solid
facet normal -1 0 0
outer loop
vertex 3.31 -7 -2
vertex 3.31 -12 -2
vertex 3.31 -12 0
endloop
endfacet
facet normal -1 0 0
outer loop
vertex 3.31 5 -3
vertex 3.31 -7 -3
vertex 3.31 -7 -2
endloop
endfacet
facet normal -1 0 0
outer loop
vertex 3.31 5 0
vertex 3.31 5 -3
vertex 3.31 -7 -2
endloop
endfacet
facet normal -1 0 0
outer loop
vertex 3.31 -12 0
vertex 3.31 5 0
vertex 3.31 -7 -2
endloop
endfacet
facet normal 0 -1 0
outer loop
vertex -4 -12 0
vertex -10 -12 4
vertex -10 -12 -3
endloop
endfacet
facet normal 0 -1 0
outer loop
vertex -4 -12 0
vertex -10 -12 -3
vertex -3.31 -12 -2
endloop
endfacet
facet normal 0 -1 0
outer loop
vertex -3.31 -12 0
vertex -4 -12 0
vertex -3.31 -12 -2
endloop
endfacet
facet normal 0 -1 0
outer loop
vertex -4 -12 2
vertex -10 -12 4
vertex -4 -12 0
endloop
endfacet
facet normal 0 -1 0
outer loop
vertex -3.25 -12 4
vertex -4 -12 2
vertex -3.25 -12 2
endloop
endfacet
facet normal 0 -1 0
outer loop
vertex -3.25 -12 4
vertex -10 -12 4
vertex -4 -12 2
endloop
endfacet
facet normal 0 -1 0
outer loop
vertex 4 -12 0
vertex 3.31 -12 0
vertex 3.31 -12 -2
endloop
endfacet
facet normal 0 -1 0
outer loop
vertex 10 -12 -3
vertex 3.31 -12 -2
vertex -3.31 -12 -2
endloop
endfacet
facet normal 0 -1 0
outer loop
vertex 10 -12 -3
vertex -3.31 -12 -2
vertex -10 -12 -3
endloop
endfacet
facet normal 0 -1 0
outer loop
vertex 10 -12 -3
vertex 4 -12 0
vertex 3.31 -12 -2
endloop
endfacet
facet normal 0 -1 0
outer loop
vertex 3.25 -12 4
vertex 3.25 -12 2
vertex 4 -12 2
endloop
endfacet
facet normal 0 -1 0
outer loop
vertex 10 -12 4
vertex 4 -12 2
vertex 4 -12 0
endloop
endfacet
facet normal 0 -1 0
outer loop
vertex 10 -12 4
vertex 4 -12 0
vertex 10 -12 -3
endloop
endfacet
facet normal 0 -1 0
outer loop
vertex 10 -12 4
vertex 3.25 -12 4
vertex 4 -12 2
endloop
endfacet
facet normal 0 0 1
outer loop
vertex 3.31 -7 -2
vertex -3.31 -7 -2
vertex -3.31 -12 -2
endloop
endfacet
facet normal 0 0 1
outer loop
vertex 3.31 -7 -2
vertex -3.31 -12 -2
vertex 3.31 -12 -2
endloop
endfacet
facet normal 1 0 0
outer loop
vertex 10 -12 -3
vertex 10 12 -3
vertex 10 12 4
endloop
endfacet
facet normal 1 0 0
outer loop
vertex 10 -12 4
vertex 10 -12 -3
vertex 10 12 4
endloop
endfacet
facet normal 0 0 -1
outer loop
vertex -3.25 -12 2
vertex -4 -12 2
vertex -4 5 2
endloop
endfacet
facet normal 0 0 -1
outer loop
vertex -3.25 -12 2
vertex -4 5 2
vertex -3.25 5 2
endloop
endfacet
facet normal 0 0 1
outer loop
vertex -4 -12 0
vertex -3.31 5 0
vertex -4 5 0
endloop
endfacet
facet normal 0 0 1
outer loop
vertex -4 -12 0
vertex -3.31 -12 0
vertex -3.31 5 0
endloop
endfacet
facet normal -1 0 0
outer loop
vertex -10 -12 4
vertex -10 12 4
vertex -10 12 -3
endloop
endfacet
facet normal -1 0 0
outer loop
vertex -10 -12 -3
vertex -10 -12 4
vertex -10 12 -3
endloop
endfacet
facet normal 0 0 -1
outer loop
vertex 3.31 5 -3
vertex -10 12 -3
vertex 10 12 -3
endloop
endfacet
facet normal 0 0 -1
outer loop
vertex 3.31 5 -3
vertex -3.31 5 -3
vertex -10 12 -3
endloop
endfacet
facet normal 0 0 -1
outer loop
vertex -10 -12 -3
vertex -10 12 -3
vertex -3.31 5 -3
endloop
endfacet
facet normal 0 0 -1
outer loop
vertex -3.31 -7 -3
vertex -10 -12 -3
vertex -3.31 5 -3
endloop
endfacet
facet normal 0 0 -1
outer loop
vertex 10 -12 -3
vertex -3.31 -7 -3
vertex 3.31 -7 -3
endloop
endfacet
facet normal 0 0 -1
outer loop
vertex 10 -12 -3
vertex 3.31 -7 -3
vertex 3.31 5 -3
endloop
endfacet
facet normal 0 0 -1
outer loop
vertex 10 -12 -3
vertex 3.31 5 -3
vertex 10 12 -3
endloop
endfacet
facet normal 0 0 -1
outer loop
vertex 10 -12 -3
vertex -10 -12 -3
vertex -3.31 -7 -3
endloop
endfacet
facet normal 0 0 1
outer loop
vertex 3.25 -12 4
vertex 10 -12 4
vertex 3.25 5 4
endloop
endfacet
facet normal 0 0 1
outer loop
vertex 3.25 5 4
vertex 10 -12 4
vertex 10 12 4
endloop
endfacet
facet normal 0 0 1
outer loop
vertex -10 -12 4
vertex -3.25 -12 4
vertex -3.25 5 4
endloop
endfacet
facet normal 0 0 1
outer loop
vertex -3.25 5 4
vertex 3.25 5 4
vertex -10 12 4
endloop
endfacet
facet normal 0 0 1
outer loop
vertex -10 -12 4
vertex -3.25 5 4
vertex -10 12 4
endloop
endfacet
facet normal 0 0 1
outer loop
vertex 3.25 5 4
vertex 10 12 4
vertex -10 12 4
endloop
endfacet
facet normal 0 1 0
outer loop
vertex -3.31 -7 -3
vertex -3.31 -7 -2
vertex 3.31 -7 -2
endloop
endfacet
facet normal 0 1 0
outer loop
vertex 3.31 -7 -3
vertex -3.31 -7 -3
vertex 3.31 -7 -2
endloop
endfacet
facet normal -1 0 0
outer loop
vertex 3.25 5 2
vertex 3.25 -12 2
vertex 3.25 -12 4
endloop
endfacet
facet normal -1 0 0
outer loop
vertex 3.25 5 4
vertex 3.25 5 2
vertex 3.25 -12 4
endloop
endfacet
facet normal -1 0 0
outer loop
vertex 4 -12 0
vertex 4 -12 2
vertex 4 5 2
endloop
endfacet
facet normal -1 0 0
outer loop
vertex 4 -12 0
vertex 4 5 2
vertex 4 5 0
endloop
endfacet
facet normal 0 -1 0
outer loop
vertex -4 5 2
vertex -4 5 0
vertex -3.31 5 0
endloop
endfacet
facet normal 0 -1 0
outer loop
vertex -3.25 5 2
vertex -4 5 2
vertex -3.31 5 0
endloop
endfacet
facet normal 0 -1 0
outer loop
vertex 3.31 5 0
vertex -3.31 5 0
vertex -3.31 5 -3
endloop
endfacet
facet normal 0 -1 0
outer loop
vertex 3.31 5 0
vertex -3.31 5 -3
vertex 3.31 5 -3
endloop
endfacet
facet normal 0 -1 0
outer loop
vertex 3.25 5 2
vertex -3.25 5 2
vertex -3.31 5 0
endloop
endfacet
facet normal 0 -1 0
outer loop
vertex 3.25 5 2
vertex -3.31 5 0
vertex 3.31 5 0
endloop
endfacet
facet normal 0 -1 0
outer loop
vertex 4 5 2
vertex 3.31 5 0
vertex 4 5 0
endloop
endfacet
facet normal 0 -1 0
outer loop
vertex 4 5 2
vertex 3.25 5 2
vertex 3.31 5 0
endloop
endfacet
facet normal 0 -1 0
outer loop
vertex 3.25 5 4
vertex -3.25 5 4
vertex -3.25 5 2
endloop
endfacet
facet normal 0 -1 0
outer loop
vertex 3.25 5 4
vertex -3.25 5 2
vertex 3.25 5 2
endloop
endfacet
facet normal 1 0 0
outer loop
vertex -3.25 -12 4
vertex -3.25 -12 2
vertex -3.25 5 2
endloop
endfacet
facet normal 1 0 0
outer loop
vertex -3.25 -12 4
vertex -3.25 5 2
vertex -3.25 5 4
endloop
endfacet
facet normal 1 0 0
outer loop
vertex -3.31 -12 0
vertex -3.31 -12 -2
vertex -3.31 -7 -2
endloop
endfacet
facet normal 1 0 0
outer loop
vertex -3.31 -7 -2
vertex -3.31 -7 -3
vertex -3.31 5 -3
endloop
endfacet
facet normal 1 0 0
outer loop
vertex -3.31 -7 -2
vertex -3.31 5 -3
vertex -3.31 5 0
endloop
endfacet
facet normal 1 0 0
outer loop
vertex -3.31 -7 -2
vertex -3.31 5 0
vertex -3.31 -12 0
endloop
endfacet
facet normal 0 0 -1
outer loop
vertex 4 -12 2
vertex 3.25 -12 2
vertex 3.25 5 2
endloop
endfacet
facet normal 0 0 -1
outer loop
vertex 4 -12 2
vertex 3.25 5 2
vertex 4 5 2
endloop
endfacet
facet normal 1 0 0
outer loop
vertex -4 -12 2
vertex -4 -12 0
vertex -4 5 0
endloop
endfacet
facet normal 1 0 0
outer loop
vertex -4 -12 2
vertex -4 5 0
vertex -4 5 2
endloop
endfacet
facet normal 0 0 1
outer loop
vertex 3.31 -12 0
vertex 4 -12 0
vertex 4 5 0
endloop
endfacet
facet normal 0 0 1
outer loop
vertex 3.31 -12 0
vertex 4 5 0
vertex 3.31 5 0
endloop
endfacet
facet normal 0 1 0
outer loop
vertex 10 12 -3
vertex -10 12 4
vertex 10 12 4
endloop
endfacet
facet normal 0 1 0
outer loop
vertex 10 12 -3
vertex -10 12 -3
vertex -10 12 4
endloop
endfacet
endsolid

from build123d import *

# Parameters (mm, degrees)
F0_W     = 0.75
F0_H     = 2
F1_DEPTH = 12
F2_W     = 6.62
F2_H     = 2
F3_DEPTH = 12
F4_DEPTH = 8
F5_W     = 8
F5_H     = 4
F6_DEPTH = 4
F7_W     = 6.62
F7_H     = 12
F8_DEPTH = 3
F9_DEPTH = 3


with BuildPart() as f1:
    # F0 (on Front) → F1 (new body, symmetric)
    with BuildSketch(Plane.XZ):
        Polygon((-4, 4), (-10, 4), (-10, -3), (10, -3), (10, 4), (4, 4), (4, 2), (4, 0), (-4, 0), (-4, 2), align=None)
        with Locations((-3.625, 3)):
            Rectangle(F0_W, F0_H)
        with Locations((3.625, 3)):
            Rectangle(F0_W, F0_H)
    extrude(amount=F1_DEPTH, both=True)

    # F2 (on Front) → F3 (cut)
    with BuildSketch(Plane.XZ):
        with Locations((0, -1)):
            Rectangle(F2_W, F2_H)
    extrude(amount=F3_DEPTH, mode=Mode.SUBTRACT)

    # F2 (on Front) → F4 (cut)
    with BuildSketch(Plane.XZ):
        with Locations((0, -1)):
            Rectangle(F2_W, F2_H)
    extrude(amount=-F4_DEPTH, mode=Mode.SUBTRACT)

    # F5 (on Top) → F6 (join)
    with BuildSketch(Plane.XY):
        with Locations((0, 10)):
            Rectangle(F5_W, F5_H)
    extrude(amount=F6_DEPTH)

    # F7 (on Top) → F8 (cut)
    with BuildSketch(Plane.XY):
        with Locations((0, -1)):
            Rectangle(F7_W, F7_H)
    extrude(amount=-F8_DEPTH, mode=Mode.SUBTRACT)

    # F6_face (on face) → F9 (join)
    with BuildSketch(Plane(origin=(0, 8, 0.988636), x_dir=(1, 0, 0), z_dir=(0, -1, 0))):
        Polygon((-4, -0.988636), (-3.31, -0.988636), (-3.31, -2.988636), (3.31, -2.988636), (3.31, -0.988636), (4, -0.988636), (4, 1.011364), (3.25, 1.011364), (3.25, 3.011364), (-3.25, 3.011364), (-3.25, 1.011364), (-4, 1.011364), align=None)
    extrude(amount=F9_DEPTH)


solid = f1.part
